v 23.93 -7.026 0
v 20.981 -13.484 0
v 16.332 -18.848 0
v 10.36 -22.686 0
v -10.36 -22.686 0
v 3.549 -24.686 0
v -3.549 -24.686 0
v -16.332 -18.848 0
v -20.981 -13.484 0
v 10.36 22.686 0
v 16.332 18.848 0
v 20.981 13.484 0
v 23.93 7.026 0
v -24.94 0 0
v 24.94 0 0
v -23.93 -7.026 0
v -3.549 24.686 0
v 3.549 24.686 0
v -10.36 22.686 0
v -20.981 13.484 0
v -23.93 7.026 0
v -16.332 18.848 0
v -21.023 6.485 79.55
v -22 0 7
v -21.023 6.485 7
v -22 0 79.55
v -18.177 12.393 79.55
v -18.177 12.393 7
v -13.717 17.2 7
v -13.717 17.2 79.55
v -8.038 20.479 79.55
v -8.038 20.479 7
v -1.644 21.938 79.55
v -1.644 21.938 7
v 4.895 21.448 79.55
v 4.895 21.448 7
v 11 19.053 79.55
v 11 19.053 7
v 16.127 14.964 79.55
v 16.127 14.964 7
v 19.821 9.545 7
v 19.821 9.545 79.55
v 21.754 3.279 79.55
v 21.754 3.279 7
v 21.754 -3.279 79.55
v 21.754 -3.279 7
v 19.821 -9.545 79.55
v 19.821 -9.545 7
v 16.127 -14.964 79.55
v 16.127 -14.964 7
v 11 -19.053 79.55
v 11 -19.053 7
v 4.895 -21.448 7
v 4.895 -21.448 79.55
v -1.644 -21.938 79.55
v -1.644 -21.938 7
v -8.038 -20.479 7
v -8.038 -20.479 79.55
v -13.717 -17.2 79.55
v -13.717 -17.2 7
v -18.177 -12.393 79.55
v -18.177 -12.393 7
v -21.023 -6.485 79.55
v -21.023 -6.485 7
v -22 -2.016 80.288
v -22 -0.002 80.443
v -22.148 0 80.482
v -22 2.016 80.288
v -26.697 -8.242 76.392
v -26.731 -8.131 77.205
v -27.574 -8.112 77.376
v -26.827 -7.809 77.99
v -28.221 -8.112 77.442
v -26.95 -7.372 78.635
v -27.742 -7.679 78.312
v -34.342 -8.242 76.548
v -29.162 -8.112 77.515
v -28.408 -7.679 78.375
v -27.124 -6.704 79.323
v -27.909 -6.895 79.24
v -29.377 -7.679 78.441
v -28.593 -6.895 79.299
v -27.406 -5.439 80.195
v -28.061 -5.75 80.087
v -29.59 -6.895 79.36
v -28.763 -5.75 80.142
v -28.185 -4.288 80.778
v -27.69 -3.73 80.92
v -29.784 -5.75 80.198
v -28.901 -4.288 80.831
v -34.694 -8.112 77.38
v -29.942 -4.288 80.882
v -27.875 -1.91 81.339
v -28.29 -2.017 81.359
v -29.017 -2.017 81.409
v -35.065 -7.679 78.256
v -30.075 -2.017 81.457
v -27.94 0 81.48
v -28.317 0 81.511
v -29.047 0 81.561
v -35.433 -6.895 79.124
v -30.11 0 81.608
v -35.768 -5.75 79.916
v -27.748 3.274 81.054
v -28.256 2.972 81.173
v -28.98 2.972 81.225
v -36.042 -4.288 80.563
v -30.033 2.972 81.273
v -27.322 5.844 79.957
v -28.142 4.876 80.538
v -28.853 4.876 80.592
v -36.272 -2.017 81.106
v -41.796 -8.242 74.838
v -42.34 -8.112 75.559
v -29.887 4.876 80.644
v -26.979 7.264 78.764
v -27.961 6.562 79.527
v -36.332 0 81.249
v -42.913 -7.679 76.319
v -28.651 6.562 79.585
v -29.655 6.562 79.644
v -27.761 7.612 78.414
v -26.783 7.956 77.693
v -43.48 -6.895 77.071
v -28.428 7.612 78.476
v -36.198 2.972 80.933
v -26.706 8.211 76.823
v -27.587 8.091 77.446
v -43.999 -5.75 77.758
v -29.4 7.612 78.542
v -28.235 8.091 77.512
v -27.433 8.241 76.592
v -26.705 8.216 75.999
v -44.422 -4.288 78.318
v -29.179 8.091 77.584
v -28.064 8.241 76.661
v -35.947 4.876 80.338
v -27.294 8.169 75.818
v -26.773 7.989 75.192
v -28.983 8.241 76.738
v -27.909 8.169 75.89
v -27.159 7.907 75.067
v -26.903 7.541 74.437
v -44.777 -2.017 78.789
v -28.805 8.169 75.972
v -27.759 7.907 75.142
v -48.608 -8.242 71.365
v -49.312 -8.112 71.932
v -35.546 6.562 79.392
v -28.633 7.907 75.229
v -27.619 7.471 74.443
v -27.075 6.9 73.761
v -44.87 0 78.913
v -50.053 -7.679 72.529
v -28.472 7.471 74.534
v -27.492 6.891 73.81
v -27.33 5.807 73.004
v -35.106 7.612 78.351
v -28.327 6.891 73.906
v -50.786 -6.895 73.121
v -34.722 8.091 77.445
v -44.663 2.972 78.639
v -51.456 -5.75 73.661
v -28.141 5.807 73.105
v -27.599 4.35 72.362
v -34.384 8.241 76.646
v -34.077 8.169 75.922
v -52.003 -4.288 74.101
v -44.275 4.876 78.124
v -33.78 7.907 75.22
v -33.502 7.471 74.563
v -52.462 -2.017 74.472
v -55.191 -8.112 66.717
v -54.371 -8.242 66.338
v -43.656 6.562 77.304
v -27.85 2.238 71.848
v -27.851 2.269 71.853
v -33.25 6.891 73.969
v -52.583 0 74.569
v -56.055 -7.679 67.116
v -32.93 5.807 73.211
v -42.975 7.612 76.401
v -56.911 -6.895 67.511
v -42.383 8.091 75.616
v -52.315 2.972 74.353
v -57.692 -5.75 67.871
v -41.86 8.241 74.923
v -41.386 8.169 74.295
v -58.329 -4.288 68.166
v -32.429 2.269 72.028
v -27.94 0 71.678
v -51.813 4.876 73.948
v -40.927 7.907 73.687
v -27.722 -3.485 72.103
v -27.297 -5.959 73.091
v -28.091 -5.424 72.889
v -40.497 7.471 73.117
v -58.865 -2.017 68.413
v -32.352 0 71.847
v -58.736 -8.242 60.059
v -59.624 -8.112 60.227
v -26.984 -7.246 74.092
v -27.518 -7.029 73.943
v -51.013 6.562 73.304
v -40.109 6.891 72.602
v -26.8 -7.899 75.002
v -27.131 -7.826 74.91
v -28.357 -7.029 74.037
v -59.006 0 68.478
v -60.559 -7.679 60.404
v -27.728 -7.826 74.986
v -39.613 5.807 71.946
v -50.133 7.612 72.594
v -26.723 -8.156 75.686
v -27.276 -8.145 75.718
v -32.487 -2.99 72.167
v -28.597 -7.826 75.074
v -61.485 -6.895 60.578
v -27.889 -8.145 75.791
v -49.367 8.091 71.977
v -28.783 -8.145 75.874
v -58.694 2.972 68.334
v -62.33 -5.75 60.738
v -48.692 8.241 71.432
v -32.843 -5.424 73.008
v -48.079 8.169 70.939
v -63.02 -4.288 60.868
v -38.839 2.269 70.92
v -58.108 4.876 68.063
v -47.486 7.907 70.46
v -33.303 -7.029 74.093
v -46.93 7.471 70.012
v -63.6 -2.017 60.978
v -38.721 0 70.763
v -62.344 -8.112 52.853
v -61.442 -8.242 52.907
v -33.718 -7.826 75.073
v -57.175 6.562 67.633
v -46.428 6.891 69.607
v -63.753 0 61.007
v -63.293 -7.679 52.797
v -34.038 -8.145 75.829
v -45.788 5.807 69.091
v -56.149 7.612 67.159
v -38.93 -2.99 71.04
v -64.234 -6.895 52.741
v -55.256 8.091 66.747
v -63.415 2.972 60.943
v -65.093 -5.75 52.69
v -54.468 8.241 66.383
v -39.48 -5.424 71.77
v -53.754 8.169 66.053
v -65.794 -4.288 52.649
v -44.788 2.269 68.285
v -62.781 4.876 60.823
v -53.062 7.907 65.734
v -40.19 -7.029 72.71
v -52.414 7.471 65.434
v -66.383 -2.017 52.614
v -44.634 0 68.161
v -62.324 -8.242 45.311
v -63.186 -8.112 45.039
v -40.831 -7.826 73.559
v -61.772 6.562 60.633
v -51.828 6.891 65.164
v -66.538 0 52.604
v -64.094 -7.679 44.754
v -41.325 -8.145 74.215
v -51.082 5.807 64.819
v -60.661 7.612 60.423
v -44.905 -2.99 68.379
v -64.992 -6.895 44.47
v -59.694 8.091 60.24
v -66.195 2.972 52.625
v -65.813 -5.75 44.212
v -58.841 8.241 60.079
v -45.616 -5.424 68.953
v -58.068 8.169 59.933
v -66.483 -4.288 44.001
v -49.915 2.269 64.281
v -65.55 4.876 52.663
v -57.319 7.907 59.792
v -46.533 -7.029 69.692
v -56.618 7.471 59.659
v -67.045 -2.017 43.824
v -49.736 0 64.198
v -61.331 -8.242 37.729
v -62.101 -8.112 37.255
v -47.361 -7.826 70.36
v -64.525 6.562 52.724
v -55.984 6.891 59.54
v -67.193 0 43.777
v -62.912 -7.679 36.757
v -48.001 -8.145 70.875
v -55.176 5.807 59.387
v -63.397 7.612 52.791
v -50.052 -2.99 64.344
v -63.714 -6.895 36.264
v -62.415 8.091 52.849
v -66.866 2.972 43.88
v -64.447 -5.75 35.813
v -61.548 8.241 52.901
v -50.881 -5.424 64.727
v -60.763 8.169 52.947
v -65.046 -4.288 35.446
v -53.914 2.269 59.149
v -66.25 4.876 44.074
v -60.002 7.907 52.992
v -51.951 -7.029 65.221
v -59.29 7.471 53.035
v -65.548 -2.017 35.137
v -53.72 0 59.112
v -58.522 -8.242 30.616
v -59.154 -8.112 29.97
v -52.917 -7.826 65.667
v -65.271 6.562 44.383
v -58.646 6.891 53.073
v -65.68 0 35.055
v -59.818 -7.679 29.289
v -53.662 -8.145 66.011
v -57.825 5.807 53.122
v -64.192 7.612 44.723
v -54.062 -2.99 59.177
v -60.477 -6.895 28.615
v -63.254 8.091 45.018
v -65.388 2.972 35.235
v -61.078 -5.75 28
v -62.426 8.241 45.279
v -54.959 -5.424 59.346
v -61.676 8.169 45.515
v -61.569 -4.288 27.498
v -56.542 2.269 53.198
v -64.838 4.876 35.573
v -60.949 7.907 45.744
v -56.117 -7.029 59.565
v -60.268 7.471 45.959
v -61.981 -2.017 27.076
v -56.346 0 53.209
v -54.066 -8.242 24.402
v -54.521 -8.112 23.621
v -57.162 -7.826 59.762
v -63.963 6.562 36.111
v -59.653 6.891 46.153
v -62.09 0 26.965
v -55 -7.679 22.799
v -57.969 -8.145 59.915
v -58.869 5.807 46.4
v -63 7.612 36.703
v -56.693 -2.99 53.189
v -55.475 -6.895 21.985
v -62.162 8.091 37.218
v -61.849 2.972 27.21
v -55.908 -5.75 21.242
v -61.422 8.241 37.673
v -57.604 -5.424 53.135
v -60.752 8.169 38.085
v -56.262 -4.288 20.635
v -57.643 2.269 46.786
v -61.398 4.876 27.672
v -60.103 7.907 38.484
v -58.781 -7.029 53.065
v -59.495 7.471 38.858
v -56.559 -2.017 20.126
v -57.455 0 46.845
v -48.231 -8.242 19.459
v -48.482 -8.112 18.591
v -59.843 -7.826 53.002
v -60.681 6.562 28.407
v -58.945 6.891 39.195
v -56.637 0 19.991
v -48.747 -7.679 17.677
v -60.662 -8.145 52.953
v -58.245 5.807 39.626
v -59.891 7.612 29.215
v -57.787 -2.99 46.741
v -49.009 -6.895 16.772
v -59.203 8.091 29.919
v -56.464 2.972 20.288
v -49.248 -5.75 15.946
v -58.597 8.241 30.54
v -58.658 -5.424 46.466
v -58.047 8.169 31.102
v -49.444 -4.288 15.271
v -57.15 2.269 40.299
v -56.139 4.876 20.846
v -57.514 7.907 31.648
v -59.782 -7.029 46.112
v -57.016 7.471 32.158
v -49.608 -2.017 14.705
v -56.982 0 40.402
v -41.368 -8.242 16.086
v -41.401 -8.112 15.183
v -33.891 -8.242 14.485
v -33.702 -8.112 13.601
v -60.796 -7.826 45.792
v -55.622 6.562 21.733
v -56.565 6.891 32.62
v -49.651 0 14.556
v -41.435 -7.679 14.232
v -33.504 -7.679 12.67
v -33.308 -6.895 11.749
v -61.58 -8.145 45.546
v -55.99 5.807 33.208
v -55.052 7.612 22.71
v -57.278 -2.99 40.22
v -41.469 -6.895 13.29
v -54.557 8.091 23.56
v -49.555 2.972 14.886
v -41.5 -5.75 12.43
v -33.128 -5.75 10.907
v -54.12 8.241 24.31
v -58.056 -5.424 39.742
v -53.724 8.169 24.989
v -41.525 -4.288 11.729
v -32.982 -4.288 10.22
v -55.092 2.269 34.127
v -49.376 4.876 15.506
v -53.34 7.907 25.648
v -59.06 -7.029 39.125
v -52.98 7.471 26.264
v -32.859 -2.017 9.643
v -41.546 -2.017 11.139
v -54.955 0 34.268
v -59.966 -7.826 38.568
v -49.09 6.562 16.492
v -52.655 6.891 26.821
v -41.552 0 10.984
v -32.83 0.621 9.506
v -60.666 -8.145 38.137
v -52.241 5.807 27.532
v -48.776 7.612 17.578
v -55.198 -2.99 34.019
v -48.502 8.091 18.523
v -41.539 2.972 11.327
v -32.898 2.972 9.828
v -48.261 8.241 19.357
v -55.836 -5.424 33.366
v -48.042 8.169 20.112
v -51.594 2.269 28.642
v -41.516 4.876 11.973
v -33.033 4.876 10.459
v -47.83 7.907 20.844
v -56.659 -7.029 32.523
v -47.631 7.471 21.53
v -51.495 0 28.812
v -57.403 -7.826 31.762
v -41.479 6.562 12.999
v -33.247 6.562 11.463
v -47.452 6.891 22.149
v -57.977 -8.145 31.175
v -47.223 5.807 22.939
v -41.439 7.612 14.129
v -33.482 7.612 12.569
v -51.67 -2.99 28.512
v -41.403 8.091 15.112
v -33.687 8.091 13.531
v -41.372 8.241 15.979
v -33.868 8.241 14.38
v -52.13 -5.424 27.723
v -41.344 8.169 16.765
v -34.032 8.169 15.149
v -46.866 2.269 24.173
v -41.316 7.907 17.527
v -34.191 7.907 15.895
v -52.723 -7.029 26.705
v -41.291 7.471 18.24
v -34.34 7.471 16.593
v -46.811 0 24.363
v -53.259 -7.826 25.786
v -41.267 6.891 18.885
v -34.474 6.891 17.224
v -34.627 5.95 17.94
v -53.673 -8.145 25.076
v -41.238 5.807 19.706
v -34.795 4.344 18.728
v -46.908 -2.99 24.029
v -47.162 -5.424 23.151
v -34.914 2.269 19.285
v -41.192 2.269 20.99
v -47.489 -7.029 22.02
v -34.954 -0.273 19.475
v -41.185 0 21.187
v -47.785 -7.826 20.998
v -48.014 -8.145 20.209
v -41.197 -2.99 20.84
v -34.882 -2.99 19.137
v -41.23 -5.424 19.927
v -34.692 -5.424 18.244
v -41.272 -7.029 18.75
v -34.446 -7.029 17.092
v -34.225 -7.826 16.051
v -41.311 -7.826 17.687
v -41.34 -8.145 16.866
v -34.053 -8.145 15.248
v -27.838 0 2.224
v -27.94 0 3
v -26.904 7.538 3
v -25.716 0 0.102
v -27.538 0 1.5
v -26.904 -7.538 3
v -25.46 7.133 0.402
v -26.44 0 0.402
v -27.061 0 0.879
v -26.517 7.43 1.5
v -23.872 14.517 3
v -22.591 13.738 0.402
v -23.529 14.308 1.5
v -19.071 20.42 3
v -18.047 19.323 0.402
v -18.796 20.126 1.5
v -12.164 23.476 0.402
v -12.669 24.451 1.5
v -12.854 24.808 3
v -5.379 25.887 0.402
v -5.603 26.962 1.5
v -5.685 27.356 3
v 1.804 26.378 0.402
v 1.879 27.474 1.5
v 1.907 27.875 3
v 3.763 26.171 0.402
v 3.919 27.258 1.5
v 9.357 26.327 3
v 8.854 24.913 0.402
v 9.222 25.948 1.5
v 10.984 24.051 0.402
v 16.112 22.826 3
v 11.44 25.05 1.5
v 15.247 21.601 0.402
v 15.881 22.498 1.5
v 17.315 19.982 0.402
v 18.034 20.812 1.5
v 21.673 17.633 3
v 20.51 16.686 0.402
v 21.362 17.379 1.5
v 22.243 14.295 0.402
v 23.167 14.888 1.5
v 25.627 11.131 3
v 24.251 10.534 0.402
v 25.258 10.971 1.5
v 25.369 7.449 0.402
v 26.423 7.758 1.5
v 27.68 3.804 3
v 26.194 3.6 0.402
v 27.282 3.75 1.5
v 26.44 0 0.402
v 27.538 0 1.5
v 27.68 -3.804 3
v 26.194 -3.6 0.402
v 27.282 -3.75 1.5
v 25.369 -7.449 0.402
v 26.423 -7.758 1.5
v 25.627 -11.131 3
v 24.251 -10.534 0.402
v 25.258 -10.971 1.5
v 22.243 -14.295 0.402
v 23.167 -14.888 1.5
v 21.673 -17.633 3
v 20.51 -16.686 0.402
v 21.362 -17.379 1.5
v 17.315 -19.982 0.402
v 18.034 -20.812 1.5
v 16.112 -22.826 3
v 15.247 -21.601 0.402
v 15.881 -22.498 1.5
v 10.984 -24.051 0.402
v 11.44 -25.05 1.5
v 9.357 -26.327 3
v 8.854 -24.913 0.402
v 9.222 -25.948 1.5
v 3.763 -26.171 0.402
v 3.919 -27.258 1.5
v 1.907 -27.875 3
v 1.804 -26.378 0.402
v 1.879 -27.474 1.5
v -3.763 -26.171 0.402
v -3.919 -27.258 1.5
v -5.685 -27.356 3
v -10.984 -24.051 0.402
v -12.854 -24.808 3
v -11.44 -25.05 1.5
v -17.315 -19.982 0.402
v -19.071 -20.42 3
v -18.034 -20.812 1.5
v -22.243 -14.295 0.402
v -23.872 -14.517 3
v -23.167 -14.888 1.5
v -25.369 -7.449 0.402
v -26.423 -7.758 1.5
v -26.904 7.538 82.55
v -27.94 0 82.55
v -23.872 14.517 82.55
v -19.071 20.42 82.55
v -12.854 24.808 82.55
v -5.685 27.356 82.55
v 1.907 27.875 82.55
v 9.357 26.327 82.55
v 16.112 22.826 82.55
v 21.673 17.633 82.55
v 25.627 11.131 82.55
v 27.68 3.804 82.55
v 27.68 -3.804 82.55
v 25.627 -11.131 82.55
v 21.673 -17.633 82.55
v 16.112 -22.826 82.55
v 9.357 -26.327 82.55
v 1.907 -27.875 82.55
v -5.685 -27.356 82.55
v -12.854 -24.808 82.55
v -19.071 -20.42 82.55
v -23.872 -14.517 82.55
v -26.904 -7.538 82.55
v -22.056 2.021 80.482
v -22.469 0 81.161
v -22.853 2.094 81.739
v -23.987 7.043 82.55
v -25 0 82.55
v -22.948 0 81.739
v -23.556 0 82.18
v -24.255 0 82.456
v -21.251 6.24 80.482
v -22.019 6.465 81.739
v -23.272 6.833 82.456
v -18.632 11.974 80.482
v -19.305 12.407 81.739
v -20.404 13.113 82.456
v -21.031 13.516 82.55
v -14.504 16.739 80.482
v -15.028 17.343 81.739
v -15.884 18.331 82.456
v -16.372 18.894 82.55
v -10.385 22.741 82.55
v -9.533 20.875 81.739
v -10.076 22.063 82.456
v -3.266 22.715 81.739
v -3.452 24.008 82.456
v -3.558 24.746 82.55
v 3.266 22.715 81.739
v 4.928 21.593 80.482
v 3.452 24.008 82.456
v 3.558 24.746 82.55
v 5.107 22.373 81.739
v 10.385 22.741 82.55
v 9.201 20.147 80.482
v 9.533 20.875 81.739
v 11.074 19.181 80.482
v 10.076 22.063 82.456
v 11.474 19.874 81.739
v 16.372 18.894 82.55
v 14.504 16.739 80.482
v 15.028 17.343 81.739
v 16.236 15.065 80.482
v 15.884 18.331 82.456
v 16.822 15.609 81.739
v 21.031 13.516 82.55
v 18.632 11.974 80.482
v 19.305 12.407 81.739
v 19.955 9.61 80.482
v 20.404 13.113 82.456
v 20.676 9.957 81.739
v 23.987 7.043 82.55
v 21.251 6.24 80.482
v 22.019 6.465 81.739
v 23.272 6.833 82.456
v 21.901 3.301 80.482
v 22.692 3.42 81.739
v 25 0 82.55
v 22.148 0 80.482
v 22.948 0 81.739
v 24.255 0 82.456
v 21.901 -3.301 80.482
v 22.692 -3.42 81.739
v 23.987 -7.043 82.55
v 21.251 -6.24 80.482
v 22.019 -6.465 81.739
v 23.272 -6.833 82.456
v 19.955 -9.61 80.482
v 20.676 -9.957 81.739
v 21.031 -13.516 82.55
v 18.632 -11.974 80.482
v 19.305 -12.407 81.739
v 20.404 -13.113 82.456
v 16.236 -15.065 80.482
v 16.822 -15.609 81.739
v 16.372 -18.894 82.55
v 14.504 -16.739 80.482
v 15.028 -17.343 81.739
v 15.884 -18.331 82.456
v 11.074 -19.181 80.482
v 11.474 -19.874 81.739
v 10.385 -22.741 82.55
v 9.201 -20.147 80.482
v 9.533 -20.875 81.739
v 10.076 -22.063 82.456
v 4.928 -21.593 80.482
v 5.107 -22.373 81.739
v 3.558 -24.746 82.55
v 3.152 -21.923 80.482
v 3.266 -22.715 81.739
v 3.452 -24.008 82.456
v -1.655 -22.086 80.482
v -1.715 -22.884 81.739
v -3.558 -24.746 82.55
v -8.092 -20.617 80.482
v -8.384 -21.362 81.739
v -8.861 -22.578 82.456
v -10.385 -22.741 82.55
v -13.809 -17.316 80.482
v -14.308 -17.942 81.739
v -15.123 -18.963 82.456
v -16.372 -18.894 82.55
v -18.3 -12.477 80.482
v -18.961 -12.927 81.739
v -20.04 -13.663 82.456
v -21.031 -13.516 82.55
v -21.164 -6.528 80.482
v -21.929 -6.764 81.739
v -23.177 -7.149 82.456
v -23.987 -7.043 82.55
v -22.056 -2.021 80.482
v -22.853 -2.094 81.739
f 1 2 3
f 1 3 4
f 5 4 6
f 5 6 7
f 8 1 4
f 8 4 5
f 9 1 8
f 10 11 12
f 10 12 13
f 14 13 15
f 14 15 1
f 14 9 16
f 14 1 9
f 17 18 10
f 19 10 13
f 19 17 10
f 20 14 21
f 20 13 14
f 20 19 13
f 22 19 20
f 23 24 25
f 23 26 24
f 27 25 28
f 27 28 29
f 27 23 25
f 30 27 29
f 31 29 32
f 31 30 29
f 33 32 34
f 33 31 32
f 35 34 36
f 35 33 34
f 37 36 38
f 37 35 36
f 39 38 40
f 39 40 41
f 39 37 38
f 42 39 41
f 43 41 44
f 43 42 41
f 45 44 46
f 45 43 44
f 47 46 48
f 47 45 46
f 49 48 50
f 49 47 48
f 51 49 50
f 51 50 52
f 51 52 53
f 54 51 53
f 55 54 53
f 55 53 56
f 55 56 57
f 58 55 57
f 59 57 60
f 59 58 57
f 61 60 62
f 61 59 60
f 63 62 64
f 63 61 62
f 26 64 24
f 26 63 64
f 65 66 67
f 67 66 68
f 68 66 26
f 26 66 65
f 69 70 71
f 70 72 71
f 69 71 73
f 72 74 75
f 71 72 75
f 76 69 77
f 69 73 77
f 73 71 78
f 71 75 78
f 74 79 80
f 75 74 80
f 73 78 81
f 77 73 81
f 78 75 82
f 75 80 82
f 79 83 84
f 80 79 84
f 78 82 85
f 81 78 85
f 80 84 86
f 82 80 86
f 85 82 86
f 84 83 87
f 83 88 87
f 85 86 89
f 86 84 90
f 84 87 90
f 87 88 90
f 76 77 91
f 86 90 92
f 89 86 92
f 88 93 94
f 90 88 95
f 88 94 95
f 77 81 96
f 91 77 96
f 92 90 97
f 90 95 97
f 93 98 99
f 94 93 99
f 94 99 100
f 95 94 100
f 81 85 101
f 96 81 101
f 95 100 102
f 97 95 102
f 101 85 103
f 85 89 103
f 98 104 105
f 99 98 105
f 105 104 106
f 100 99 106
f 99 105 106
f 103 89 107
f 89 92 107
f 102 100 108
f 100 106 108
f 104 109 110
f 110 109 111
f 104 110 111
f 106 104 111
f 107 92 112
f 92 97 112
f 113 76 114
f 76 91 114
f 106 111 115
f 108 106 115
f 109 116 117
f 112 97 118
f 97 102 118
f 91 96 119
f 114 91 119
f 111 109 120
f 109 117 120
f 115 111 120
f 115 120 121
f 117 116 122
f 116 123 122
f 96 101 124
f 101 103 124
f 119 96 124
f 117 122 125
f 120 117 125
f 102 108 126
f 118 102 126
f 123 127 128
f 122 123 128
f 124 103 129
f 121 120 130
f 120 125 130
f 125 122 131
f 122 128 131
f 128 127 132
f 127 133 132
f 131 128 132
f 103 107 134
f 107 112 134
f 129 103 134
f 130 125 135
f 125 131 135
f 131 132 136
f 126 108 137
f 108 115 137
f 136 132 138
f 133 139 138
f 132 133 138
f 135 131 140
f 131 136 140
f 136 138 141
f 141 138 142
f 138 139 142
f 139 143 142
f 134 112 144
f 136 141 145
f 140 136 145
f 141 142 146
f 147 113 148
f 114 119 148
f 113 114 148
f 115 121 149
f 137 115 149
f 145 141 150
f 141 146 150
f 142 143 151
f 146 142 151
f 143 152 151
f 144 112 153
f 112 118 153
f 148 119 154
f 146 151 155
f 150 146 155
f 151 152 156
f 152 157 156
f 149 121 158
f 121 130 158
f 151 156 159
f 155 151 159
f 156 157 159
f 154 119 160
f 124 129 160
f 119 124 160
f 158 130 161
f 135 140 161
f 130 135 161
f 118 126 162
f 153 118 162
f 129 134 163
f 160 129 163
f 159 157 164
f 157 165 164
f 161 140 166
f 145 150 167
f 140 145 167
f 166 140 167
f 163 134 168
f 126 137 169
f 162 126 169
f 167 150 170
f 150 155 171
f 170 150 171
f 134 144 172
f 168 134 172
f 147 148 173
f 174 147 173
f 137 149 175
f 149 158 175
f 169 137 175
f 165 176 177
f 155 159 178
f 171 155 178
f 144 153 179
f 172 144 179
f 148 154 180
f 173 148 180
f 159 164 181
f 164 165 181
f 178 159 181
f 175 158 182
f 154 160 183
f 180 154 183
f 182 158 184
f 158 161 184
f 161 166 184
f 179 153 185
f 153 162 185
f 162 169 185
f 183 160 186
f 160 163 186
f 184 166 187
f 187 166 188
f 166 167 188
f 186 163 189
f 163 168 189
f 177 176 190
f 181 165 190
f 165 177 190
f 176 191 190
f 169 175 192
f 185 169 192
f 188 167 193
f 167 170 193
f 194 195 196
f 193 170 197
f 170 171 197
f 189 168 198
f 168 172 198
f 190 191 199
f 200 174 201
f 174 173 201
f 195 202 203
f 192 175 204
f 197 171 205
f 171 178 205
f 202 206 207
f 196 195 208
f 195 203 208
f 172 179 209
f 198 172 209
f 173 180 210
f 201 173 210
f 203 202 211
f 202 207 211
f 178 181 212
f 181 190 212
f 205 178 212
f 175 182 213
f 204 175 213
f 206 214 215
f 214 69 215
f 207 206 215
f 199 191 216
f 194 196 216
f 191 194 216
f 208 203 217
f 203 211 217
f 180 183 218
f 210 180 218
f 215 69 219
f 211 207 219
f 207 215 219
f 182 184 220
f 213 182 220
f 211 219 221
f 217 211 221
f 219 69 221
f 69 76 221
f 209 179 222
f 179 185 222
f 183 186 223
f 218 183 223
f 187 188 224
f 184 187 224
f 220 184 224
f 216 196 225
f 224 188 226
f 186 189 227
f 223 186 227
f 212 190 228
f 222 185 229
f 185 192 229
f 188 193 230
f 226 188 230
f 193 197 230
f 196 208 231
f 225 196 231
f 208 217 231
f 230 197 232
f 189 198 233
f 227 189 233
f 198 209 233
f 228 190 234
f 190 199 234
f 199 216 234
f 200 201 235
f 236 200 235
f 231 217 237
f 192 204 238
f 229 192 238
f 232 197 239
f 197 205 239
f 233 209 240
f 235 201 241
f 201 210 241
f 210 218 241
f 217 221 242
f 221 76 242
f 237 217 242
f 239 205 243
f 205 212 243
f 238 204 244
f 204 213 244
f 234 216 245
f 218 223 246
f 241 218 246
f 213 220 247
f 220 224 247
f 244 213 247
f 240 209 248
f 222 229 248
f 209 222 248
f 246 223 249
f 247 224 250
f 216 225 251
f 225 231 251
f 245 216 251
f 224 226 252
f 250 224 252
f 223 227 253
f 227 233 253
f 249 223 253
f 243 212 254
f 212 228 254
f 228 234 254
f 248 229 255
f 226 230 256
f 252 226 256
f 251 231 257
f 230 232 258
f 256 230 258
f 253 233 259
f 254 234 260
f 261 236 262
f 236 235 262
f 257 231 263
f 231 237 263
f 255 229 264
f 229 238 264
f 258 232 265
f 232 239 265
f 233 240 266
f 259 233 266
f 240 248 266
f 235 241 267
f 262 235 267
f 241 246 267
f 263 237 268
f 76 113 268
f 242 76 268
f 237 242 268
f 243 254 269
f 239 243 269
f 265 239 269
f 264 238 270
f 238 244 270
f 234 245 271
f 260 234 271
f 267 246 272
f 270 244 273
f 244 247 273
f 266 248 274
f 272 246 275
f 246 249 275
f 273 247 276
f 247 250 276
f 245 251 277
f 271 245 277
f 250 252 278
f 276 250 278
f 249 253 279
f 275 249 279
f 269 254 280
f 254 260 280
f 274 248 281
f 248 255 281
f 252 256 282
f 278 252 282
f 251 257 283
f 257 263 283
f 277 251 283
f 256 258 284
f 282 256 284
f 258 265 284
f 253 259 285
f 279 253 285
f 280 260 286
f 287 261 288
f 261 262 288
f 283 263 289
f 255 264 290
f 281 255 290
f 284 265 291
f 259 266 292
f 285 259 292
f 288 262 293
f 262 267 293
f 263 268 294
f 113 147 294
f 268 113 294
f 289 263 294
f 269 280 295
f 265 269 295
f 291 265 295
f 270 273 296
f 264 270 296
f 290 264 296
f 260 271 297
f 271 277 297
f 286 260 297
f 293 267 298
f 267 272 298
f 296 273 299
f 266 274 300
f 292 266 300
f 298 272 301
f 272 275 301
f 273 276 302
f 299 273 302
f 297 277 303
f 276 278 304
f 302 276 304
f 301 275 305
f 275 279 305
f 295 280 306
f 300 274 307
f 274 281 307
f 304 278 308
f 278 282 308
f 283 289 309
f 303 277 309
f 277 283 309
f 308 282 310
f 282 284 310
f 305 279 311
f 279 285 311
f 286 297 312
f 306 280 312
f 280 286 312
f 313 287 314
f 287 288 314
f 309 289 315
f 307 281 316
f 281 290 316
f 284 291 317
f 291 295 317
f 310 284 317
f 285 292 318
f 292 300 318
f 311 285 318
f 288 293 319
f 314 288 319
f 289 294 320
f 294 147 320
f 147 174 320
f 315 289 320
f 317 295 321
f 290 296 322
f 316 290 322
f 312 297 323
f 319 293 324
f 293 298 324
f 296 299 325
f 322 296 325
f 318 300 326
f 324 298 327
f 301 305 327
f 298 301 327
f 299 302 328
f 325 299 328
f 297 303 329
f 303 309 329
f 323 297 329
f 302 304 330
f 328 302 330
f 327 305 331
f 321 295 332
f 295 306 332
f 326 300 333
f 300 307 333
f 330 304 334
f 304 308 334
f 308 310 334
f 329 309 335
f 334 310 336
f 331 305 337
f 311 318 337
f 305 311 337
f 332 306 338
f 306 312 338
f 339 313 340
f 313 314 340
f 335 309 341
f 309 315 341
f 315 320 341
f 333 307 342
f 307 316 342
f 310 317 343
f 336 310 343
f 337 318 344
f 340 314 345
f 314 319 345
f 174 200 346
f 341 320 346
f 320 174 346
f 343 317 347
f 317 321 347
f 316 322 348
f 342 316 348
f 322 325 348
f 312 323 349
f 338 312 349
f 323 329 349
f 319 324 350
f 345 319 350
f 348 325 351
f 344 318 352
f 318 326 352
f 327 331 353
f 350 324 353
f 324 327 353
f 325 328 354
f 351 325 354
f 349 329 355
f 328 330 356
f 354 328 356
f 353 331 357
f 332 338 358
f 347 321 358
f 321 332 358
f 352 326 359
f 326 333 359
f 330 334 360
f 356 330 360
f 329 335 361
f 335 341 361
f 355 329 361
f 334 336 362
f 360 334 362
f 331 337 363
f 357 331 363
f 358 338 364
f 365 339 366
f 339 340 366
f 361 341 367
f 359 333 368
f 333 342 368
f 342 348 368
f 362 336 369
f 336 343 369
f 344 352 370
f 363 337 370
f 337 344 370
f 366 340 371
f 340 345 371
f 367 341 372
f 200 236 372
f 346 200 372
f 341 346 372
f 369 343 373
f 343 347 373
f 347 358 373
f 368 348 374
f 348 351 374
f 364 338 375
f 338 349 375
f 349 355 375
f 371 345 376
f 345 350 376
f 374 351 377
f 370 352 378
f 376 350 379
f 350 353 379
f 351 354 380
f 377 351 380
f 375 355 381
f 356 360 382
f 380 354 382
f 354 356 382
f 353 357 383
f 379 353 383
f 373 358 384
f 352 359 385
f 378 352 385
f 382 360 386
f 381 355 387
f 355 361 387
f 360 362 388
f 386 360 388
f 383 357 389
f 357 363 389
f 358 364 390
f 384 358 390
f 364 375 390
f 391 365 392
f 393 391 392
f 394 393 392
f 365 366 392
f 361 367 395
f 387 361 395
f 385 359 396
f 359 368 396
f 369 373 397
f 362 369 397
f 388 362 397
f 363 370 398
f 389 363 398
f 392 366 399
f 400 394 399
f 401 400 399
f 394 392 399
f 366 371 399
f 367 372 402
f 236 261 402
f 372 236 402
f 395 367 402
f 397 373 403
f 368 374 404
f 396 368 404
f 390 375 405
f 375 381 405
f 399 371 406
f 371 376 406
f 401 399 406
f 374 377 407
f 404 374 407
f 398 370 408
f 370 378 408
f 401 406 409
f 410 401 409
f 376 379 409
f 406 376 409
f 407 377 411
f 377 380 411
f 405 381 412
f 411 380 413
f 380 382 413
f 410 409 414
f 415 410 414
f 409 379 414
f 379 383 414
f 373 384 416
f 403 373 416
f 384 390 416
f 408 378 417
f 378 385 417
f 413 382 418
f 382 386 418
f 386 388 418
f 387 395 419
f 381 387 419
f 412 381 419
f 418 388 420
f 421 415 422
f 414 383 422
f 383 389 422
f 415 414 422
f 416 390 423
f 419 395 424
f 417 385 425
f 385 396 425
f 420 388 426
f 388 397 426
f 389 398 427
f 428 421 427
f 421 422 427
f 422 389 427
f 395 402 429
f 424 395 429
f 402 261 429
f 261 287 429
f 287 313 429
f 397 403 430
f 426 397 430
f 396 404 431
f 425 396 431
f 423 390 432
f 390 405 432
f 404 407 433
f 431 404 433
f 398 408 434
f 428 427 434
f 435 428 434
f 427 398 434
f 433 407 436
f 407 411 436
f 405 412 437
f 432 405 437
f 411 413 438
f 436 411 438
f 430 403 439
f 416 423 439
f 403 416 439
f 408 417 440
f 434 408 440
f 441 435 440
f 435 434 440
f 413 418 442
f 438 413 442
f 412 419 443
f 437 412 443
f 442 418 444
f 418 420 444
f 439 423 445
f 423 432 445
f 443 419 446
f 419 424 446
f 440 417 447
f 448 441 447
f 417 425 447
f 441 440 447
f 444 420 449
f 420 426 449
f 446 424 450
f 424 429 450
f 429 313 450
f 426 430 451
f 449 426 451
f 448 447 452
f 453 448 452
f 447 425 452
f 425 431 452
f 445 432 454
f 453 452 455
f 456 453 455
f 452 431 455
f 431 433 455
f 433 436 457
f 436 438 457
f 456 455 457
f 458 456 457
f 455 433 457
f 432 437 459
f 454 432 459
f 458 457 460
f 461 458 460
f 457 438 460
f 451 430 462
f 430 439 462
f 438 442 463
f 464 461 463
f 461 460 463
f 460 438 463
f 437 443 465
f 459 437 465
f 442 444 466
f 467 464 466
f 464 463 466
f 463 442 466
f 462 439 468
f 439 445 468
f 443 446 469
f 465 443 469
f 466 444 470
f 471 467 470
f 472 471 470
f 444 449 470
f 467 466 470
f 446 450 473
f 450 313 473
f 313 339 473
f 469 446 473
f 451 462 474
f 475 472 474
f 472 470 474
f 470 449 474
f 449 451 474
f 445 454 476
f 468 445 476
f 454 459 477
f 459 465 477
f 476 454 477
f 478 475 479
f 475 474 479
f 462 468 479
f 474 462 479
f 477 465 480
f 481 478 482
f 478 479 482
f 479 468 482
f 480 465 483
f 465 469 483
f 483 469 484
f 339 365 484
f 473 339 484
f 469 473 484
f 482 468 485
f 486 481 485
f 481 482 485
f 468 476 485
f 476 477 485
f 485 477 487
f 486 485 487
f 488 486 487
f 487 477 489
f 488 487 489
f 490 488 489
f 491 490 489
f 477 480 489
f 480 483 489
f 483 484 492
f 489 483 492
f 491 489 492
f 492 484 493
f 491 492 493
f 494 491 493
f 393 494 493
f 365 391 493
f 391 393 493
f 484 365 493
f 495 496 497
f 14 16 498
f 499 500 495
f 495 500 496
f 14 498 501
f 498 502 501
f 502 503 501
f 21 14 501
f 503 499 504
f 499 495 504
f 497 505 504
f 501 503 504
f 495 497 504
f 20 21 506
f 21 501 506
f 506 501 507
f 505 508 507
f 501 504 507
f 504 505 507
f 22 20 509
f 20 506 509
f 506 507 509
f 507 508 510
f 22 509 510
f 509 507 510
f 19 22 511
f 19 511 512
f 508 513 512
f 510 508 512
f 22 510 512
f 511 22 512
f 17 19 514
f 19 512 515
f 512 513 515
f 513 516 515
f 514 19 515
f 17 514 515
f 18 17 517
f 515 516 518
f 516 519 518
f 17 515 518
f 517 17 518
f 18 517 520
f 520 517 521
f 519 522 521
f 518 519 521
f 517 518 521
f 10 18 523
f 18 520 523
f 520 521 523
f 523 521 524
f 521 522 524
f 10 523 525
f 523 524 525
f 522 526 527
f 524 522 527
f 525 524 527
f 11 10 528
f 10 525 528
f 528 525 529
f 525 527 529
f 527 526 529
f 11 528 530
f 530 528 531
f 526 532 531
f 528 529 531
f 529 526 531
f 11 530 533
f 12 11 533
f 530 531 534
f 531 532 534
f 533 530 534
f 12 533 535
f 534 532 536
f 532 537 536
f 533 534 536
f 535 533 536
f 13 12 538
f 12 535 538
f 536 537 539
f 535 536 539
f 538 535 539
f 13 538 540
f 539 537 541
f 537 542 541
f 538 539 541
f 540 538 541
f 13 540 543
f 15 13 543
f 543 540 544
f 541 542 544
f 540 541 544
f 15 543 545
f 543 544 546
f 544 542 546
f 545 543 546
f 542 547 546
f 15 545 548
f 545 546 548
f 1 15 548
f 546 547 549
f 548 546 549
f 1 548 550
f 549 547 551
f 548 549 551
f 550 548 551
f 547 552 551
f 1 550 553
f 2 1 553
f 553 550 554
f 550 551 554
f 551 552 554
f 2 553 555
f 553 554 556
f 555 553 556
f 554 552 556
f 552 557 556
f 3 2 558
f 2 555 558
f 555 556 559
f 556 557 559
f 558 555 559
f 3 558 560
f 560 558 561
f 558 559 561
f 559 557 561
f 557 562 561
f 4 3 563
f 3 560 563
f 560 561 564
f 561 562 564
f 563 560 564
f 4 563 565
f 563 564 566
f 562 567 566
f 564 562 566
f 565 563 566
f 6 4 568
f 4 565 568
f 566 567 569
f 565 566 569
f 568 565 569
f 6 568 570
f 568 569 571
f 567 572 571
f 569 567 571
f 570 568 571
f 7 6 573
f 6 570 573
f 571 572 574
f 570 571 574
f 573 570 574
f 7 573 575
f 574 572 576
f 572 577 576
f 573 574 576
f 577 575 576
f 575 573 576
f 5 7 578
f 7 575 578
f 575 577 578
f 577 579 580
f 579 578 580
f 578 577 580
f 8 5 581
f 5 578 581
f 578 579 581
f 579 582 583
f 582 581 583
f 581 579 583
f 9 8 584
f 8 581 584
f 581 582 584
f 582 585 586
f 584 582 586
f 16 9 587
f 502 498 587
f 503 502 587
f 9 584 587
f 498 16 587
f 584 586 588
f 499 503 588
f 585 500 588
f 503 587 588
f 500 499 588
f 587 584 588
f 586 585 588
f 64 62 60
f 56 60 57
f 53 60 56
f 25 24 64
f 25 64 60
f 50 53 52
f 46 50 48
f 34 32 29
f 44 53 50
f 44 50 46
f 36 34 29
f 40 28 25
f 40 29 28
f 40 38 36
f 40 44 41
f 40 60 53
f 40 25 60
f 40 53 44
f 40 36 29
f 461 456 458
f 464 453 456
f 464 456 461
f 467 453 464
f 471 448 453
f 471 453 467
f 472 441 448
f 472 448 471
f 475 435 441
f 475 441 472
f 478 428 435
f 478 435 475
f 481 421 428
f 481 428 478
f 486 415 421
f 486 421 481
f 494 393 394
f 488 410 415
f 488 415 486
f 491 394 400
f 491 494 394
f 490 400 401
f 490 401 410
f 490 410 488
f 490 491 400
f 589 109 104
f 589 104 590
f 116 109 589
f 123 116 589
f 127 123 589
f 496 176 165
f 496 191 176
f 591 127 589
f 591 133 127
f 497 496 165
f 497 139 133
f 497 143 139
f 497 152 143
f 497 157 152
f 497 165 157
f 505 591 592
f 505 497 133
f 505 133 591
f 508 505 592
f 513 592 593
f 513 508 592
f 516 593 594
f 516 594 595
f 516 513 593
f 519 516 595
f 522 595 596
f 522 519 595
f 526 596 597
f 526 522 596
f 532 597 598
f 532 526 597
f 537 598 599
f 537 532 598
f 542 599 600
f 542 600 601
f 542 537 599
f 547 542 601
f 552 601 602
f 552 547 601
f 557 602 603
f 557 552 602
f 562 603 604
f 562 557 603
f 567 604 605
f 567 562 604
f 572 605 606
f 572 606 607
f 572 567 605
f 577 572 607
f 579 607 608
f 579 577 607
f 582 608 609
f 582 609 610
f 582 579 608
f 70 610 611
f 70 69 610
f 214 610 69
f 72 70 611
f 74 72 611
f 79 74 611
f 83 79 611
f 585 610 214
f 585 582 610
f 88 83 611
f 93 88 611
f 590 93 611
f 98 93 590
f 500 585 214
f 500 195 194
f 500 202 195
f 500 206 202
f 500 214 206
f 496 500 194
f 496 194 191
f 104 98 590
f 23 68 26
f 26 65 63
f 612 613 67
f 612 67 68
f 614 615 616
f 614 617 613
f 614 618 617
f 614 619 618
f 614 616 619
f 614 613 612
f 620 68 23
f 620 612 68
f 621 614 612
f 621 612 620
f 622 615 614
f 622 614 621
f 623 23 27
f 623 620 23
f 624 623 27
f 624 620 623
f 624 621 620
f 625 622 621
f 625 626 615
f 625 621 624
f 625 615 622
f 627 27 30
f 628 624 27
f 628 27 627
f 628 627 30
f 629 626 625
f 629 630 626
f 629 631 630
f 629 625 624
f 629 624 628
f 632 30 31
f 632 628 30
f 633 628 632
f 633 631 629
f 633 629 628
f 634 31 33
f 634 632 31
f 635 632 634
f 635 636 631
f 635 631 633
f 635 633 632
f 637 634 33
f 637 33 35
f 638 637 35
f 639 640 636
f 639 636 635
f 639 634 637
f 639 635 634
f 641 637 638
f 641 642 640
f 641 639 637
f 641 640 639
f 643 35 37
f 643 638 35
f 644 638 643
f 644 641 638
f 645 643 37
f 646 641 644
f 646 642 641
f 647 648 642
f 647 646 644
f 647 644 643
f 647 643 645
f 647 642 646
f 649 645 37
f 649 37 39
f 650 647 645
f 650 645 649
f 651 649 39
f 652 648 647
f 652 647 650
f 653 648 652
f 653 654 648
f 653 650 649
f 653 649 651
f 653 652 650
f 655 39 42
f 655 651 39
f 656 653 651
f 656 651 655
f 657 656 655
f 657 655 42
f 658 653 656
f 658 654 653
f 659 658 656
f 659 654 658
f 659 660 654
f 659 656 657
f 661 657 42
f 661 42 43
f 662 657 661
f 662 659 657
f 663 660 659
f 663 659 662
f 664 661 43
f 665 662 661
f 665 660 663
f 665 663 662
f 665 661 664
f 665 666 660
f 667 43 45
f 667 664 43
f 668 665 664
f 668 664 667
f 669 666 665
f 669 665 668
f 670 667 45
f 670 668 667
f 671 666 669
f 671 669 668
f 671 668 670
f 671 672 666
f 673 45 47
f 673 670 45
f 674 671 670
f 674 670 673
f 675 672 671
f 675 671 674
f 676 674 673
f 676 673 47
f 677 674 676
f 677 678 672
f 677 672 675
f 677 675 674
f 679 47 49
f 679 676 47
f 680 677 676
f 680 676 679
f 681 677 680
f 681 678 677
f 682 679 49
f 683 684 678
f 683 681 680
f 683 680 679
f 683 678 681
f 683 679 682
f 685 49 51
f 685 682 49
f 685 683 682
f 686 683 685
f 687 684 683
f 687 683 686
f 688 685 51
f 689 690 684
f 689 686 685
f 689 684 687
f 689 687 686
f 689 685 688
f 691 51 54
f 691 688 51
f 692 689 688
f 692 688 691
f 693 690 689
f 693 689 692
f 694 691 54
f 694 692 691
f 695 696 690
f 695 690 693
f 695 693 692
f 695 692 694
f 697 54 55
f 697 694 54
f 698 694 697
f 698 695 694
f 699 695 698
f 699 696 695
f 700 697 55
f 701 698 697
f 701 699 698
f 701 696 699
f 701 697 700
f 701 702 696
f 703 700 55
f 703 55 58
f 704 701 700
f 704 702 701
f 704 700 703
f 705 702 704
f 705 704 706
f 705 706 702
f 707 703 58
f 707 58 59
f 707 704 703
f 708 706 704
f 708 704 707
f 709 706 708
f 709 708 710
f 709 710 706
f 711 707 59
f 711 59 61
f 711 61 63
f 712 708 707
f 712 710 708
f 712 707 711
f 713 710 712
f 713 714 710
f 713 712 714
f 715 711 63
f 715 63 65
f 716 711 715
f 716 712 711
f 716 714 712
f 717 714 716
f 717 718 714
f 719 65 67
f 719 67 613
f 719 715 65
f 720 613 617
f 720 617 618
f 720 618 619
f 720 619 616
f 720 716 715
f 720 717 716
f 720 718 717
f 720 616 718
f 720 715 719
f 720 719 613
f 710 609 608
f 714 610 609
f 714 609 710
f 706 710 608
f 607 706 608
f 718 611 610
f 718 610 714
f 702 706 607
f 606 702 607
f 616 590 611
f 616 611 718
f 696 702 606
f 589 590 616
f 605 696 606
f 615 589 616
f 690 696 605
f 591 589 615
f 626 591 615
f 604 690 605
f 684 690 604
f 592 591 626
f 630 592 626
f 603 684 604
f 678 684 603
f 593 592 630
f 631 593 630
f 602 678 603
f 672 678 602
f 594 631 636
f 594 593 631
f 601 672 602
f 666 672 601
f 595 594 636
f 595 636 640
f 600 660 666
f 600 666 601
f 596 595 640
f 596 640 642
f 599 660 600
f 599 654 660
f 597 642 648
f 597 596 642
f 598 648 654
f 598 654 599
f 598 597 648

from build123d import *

# Parameters (mm, degrees)
F2_R = 3


with BuildPart() as f1:
    # F0 (on Front) → F1 (revolve)
    with BuildSketch(Plane.XZ):
        Polygon((-27.94, 0), (0, 0), (0, 7), (-22, 7), (-22, 82.55), (-27.94, 82.55), align=None)
    revolve(axis=Axis((0, 0, 3.5), (0, 0, -1)))

    # F2
    f2_edges = [f1.edges().sort_by_distance(p)[0] for p in [
        (22, 0, 82.55),
        (27.94, 0, 0),
    ]]
    fillet(f2_edges, radius=F2_R)

    # F6: sweep along a path in F4
    with BuildLine(Plane.XZ) as f6_path:
        ThreePointArc((-27.9568824917, 75.0939920545), (-60.8796643301, 45.6174495611), (-28.1154159456, 15.9647911787))
    # F5 (on line) → F6 (sweep)
    with BuildSketch(Plane(origin=(-22, 0, 0), x_dir=(0, -1, 0), z_dir=(-1, 0, 0))):
        with BuildLine():
            add(Edge.make_bspline(
                [(8.2423, 75.3380134702), (8.2423, 84.1801954249), (-4.12115, 79.7591044475), (-16.4846, 75.3380134702), (-4.12115, 70.9169224928), (8.2423, 66.4958315155), (8.2423, 75.3380134702)],
                knots=[0, 0, 0, 2.0943951024, 2.0943951024, 4.1887902048, 4.1887902048, 6.2831853072, 6.2831853072, 6.2831853072], degree=2, weights=[1, 0.5, 1, 0.5, 1, 0.5, 1]))
        make_face()
    sweep(path=f6_path.line)


solid = f1.part
